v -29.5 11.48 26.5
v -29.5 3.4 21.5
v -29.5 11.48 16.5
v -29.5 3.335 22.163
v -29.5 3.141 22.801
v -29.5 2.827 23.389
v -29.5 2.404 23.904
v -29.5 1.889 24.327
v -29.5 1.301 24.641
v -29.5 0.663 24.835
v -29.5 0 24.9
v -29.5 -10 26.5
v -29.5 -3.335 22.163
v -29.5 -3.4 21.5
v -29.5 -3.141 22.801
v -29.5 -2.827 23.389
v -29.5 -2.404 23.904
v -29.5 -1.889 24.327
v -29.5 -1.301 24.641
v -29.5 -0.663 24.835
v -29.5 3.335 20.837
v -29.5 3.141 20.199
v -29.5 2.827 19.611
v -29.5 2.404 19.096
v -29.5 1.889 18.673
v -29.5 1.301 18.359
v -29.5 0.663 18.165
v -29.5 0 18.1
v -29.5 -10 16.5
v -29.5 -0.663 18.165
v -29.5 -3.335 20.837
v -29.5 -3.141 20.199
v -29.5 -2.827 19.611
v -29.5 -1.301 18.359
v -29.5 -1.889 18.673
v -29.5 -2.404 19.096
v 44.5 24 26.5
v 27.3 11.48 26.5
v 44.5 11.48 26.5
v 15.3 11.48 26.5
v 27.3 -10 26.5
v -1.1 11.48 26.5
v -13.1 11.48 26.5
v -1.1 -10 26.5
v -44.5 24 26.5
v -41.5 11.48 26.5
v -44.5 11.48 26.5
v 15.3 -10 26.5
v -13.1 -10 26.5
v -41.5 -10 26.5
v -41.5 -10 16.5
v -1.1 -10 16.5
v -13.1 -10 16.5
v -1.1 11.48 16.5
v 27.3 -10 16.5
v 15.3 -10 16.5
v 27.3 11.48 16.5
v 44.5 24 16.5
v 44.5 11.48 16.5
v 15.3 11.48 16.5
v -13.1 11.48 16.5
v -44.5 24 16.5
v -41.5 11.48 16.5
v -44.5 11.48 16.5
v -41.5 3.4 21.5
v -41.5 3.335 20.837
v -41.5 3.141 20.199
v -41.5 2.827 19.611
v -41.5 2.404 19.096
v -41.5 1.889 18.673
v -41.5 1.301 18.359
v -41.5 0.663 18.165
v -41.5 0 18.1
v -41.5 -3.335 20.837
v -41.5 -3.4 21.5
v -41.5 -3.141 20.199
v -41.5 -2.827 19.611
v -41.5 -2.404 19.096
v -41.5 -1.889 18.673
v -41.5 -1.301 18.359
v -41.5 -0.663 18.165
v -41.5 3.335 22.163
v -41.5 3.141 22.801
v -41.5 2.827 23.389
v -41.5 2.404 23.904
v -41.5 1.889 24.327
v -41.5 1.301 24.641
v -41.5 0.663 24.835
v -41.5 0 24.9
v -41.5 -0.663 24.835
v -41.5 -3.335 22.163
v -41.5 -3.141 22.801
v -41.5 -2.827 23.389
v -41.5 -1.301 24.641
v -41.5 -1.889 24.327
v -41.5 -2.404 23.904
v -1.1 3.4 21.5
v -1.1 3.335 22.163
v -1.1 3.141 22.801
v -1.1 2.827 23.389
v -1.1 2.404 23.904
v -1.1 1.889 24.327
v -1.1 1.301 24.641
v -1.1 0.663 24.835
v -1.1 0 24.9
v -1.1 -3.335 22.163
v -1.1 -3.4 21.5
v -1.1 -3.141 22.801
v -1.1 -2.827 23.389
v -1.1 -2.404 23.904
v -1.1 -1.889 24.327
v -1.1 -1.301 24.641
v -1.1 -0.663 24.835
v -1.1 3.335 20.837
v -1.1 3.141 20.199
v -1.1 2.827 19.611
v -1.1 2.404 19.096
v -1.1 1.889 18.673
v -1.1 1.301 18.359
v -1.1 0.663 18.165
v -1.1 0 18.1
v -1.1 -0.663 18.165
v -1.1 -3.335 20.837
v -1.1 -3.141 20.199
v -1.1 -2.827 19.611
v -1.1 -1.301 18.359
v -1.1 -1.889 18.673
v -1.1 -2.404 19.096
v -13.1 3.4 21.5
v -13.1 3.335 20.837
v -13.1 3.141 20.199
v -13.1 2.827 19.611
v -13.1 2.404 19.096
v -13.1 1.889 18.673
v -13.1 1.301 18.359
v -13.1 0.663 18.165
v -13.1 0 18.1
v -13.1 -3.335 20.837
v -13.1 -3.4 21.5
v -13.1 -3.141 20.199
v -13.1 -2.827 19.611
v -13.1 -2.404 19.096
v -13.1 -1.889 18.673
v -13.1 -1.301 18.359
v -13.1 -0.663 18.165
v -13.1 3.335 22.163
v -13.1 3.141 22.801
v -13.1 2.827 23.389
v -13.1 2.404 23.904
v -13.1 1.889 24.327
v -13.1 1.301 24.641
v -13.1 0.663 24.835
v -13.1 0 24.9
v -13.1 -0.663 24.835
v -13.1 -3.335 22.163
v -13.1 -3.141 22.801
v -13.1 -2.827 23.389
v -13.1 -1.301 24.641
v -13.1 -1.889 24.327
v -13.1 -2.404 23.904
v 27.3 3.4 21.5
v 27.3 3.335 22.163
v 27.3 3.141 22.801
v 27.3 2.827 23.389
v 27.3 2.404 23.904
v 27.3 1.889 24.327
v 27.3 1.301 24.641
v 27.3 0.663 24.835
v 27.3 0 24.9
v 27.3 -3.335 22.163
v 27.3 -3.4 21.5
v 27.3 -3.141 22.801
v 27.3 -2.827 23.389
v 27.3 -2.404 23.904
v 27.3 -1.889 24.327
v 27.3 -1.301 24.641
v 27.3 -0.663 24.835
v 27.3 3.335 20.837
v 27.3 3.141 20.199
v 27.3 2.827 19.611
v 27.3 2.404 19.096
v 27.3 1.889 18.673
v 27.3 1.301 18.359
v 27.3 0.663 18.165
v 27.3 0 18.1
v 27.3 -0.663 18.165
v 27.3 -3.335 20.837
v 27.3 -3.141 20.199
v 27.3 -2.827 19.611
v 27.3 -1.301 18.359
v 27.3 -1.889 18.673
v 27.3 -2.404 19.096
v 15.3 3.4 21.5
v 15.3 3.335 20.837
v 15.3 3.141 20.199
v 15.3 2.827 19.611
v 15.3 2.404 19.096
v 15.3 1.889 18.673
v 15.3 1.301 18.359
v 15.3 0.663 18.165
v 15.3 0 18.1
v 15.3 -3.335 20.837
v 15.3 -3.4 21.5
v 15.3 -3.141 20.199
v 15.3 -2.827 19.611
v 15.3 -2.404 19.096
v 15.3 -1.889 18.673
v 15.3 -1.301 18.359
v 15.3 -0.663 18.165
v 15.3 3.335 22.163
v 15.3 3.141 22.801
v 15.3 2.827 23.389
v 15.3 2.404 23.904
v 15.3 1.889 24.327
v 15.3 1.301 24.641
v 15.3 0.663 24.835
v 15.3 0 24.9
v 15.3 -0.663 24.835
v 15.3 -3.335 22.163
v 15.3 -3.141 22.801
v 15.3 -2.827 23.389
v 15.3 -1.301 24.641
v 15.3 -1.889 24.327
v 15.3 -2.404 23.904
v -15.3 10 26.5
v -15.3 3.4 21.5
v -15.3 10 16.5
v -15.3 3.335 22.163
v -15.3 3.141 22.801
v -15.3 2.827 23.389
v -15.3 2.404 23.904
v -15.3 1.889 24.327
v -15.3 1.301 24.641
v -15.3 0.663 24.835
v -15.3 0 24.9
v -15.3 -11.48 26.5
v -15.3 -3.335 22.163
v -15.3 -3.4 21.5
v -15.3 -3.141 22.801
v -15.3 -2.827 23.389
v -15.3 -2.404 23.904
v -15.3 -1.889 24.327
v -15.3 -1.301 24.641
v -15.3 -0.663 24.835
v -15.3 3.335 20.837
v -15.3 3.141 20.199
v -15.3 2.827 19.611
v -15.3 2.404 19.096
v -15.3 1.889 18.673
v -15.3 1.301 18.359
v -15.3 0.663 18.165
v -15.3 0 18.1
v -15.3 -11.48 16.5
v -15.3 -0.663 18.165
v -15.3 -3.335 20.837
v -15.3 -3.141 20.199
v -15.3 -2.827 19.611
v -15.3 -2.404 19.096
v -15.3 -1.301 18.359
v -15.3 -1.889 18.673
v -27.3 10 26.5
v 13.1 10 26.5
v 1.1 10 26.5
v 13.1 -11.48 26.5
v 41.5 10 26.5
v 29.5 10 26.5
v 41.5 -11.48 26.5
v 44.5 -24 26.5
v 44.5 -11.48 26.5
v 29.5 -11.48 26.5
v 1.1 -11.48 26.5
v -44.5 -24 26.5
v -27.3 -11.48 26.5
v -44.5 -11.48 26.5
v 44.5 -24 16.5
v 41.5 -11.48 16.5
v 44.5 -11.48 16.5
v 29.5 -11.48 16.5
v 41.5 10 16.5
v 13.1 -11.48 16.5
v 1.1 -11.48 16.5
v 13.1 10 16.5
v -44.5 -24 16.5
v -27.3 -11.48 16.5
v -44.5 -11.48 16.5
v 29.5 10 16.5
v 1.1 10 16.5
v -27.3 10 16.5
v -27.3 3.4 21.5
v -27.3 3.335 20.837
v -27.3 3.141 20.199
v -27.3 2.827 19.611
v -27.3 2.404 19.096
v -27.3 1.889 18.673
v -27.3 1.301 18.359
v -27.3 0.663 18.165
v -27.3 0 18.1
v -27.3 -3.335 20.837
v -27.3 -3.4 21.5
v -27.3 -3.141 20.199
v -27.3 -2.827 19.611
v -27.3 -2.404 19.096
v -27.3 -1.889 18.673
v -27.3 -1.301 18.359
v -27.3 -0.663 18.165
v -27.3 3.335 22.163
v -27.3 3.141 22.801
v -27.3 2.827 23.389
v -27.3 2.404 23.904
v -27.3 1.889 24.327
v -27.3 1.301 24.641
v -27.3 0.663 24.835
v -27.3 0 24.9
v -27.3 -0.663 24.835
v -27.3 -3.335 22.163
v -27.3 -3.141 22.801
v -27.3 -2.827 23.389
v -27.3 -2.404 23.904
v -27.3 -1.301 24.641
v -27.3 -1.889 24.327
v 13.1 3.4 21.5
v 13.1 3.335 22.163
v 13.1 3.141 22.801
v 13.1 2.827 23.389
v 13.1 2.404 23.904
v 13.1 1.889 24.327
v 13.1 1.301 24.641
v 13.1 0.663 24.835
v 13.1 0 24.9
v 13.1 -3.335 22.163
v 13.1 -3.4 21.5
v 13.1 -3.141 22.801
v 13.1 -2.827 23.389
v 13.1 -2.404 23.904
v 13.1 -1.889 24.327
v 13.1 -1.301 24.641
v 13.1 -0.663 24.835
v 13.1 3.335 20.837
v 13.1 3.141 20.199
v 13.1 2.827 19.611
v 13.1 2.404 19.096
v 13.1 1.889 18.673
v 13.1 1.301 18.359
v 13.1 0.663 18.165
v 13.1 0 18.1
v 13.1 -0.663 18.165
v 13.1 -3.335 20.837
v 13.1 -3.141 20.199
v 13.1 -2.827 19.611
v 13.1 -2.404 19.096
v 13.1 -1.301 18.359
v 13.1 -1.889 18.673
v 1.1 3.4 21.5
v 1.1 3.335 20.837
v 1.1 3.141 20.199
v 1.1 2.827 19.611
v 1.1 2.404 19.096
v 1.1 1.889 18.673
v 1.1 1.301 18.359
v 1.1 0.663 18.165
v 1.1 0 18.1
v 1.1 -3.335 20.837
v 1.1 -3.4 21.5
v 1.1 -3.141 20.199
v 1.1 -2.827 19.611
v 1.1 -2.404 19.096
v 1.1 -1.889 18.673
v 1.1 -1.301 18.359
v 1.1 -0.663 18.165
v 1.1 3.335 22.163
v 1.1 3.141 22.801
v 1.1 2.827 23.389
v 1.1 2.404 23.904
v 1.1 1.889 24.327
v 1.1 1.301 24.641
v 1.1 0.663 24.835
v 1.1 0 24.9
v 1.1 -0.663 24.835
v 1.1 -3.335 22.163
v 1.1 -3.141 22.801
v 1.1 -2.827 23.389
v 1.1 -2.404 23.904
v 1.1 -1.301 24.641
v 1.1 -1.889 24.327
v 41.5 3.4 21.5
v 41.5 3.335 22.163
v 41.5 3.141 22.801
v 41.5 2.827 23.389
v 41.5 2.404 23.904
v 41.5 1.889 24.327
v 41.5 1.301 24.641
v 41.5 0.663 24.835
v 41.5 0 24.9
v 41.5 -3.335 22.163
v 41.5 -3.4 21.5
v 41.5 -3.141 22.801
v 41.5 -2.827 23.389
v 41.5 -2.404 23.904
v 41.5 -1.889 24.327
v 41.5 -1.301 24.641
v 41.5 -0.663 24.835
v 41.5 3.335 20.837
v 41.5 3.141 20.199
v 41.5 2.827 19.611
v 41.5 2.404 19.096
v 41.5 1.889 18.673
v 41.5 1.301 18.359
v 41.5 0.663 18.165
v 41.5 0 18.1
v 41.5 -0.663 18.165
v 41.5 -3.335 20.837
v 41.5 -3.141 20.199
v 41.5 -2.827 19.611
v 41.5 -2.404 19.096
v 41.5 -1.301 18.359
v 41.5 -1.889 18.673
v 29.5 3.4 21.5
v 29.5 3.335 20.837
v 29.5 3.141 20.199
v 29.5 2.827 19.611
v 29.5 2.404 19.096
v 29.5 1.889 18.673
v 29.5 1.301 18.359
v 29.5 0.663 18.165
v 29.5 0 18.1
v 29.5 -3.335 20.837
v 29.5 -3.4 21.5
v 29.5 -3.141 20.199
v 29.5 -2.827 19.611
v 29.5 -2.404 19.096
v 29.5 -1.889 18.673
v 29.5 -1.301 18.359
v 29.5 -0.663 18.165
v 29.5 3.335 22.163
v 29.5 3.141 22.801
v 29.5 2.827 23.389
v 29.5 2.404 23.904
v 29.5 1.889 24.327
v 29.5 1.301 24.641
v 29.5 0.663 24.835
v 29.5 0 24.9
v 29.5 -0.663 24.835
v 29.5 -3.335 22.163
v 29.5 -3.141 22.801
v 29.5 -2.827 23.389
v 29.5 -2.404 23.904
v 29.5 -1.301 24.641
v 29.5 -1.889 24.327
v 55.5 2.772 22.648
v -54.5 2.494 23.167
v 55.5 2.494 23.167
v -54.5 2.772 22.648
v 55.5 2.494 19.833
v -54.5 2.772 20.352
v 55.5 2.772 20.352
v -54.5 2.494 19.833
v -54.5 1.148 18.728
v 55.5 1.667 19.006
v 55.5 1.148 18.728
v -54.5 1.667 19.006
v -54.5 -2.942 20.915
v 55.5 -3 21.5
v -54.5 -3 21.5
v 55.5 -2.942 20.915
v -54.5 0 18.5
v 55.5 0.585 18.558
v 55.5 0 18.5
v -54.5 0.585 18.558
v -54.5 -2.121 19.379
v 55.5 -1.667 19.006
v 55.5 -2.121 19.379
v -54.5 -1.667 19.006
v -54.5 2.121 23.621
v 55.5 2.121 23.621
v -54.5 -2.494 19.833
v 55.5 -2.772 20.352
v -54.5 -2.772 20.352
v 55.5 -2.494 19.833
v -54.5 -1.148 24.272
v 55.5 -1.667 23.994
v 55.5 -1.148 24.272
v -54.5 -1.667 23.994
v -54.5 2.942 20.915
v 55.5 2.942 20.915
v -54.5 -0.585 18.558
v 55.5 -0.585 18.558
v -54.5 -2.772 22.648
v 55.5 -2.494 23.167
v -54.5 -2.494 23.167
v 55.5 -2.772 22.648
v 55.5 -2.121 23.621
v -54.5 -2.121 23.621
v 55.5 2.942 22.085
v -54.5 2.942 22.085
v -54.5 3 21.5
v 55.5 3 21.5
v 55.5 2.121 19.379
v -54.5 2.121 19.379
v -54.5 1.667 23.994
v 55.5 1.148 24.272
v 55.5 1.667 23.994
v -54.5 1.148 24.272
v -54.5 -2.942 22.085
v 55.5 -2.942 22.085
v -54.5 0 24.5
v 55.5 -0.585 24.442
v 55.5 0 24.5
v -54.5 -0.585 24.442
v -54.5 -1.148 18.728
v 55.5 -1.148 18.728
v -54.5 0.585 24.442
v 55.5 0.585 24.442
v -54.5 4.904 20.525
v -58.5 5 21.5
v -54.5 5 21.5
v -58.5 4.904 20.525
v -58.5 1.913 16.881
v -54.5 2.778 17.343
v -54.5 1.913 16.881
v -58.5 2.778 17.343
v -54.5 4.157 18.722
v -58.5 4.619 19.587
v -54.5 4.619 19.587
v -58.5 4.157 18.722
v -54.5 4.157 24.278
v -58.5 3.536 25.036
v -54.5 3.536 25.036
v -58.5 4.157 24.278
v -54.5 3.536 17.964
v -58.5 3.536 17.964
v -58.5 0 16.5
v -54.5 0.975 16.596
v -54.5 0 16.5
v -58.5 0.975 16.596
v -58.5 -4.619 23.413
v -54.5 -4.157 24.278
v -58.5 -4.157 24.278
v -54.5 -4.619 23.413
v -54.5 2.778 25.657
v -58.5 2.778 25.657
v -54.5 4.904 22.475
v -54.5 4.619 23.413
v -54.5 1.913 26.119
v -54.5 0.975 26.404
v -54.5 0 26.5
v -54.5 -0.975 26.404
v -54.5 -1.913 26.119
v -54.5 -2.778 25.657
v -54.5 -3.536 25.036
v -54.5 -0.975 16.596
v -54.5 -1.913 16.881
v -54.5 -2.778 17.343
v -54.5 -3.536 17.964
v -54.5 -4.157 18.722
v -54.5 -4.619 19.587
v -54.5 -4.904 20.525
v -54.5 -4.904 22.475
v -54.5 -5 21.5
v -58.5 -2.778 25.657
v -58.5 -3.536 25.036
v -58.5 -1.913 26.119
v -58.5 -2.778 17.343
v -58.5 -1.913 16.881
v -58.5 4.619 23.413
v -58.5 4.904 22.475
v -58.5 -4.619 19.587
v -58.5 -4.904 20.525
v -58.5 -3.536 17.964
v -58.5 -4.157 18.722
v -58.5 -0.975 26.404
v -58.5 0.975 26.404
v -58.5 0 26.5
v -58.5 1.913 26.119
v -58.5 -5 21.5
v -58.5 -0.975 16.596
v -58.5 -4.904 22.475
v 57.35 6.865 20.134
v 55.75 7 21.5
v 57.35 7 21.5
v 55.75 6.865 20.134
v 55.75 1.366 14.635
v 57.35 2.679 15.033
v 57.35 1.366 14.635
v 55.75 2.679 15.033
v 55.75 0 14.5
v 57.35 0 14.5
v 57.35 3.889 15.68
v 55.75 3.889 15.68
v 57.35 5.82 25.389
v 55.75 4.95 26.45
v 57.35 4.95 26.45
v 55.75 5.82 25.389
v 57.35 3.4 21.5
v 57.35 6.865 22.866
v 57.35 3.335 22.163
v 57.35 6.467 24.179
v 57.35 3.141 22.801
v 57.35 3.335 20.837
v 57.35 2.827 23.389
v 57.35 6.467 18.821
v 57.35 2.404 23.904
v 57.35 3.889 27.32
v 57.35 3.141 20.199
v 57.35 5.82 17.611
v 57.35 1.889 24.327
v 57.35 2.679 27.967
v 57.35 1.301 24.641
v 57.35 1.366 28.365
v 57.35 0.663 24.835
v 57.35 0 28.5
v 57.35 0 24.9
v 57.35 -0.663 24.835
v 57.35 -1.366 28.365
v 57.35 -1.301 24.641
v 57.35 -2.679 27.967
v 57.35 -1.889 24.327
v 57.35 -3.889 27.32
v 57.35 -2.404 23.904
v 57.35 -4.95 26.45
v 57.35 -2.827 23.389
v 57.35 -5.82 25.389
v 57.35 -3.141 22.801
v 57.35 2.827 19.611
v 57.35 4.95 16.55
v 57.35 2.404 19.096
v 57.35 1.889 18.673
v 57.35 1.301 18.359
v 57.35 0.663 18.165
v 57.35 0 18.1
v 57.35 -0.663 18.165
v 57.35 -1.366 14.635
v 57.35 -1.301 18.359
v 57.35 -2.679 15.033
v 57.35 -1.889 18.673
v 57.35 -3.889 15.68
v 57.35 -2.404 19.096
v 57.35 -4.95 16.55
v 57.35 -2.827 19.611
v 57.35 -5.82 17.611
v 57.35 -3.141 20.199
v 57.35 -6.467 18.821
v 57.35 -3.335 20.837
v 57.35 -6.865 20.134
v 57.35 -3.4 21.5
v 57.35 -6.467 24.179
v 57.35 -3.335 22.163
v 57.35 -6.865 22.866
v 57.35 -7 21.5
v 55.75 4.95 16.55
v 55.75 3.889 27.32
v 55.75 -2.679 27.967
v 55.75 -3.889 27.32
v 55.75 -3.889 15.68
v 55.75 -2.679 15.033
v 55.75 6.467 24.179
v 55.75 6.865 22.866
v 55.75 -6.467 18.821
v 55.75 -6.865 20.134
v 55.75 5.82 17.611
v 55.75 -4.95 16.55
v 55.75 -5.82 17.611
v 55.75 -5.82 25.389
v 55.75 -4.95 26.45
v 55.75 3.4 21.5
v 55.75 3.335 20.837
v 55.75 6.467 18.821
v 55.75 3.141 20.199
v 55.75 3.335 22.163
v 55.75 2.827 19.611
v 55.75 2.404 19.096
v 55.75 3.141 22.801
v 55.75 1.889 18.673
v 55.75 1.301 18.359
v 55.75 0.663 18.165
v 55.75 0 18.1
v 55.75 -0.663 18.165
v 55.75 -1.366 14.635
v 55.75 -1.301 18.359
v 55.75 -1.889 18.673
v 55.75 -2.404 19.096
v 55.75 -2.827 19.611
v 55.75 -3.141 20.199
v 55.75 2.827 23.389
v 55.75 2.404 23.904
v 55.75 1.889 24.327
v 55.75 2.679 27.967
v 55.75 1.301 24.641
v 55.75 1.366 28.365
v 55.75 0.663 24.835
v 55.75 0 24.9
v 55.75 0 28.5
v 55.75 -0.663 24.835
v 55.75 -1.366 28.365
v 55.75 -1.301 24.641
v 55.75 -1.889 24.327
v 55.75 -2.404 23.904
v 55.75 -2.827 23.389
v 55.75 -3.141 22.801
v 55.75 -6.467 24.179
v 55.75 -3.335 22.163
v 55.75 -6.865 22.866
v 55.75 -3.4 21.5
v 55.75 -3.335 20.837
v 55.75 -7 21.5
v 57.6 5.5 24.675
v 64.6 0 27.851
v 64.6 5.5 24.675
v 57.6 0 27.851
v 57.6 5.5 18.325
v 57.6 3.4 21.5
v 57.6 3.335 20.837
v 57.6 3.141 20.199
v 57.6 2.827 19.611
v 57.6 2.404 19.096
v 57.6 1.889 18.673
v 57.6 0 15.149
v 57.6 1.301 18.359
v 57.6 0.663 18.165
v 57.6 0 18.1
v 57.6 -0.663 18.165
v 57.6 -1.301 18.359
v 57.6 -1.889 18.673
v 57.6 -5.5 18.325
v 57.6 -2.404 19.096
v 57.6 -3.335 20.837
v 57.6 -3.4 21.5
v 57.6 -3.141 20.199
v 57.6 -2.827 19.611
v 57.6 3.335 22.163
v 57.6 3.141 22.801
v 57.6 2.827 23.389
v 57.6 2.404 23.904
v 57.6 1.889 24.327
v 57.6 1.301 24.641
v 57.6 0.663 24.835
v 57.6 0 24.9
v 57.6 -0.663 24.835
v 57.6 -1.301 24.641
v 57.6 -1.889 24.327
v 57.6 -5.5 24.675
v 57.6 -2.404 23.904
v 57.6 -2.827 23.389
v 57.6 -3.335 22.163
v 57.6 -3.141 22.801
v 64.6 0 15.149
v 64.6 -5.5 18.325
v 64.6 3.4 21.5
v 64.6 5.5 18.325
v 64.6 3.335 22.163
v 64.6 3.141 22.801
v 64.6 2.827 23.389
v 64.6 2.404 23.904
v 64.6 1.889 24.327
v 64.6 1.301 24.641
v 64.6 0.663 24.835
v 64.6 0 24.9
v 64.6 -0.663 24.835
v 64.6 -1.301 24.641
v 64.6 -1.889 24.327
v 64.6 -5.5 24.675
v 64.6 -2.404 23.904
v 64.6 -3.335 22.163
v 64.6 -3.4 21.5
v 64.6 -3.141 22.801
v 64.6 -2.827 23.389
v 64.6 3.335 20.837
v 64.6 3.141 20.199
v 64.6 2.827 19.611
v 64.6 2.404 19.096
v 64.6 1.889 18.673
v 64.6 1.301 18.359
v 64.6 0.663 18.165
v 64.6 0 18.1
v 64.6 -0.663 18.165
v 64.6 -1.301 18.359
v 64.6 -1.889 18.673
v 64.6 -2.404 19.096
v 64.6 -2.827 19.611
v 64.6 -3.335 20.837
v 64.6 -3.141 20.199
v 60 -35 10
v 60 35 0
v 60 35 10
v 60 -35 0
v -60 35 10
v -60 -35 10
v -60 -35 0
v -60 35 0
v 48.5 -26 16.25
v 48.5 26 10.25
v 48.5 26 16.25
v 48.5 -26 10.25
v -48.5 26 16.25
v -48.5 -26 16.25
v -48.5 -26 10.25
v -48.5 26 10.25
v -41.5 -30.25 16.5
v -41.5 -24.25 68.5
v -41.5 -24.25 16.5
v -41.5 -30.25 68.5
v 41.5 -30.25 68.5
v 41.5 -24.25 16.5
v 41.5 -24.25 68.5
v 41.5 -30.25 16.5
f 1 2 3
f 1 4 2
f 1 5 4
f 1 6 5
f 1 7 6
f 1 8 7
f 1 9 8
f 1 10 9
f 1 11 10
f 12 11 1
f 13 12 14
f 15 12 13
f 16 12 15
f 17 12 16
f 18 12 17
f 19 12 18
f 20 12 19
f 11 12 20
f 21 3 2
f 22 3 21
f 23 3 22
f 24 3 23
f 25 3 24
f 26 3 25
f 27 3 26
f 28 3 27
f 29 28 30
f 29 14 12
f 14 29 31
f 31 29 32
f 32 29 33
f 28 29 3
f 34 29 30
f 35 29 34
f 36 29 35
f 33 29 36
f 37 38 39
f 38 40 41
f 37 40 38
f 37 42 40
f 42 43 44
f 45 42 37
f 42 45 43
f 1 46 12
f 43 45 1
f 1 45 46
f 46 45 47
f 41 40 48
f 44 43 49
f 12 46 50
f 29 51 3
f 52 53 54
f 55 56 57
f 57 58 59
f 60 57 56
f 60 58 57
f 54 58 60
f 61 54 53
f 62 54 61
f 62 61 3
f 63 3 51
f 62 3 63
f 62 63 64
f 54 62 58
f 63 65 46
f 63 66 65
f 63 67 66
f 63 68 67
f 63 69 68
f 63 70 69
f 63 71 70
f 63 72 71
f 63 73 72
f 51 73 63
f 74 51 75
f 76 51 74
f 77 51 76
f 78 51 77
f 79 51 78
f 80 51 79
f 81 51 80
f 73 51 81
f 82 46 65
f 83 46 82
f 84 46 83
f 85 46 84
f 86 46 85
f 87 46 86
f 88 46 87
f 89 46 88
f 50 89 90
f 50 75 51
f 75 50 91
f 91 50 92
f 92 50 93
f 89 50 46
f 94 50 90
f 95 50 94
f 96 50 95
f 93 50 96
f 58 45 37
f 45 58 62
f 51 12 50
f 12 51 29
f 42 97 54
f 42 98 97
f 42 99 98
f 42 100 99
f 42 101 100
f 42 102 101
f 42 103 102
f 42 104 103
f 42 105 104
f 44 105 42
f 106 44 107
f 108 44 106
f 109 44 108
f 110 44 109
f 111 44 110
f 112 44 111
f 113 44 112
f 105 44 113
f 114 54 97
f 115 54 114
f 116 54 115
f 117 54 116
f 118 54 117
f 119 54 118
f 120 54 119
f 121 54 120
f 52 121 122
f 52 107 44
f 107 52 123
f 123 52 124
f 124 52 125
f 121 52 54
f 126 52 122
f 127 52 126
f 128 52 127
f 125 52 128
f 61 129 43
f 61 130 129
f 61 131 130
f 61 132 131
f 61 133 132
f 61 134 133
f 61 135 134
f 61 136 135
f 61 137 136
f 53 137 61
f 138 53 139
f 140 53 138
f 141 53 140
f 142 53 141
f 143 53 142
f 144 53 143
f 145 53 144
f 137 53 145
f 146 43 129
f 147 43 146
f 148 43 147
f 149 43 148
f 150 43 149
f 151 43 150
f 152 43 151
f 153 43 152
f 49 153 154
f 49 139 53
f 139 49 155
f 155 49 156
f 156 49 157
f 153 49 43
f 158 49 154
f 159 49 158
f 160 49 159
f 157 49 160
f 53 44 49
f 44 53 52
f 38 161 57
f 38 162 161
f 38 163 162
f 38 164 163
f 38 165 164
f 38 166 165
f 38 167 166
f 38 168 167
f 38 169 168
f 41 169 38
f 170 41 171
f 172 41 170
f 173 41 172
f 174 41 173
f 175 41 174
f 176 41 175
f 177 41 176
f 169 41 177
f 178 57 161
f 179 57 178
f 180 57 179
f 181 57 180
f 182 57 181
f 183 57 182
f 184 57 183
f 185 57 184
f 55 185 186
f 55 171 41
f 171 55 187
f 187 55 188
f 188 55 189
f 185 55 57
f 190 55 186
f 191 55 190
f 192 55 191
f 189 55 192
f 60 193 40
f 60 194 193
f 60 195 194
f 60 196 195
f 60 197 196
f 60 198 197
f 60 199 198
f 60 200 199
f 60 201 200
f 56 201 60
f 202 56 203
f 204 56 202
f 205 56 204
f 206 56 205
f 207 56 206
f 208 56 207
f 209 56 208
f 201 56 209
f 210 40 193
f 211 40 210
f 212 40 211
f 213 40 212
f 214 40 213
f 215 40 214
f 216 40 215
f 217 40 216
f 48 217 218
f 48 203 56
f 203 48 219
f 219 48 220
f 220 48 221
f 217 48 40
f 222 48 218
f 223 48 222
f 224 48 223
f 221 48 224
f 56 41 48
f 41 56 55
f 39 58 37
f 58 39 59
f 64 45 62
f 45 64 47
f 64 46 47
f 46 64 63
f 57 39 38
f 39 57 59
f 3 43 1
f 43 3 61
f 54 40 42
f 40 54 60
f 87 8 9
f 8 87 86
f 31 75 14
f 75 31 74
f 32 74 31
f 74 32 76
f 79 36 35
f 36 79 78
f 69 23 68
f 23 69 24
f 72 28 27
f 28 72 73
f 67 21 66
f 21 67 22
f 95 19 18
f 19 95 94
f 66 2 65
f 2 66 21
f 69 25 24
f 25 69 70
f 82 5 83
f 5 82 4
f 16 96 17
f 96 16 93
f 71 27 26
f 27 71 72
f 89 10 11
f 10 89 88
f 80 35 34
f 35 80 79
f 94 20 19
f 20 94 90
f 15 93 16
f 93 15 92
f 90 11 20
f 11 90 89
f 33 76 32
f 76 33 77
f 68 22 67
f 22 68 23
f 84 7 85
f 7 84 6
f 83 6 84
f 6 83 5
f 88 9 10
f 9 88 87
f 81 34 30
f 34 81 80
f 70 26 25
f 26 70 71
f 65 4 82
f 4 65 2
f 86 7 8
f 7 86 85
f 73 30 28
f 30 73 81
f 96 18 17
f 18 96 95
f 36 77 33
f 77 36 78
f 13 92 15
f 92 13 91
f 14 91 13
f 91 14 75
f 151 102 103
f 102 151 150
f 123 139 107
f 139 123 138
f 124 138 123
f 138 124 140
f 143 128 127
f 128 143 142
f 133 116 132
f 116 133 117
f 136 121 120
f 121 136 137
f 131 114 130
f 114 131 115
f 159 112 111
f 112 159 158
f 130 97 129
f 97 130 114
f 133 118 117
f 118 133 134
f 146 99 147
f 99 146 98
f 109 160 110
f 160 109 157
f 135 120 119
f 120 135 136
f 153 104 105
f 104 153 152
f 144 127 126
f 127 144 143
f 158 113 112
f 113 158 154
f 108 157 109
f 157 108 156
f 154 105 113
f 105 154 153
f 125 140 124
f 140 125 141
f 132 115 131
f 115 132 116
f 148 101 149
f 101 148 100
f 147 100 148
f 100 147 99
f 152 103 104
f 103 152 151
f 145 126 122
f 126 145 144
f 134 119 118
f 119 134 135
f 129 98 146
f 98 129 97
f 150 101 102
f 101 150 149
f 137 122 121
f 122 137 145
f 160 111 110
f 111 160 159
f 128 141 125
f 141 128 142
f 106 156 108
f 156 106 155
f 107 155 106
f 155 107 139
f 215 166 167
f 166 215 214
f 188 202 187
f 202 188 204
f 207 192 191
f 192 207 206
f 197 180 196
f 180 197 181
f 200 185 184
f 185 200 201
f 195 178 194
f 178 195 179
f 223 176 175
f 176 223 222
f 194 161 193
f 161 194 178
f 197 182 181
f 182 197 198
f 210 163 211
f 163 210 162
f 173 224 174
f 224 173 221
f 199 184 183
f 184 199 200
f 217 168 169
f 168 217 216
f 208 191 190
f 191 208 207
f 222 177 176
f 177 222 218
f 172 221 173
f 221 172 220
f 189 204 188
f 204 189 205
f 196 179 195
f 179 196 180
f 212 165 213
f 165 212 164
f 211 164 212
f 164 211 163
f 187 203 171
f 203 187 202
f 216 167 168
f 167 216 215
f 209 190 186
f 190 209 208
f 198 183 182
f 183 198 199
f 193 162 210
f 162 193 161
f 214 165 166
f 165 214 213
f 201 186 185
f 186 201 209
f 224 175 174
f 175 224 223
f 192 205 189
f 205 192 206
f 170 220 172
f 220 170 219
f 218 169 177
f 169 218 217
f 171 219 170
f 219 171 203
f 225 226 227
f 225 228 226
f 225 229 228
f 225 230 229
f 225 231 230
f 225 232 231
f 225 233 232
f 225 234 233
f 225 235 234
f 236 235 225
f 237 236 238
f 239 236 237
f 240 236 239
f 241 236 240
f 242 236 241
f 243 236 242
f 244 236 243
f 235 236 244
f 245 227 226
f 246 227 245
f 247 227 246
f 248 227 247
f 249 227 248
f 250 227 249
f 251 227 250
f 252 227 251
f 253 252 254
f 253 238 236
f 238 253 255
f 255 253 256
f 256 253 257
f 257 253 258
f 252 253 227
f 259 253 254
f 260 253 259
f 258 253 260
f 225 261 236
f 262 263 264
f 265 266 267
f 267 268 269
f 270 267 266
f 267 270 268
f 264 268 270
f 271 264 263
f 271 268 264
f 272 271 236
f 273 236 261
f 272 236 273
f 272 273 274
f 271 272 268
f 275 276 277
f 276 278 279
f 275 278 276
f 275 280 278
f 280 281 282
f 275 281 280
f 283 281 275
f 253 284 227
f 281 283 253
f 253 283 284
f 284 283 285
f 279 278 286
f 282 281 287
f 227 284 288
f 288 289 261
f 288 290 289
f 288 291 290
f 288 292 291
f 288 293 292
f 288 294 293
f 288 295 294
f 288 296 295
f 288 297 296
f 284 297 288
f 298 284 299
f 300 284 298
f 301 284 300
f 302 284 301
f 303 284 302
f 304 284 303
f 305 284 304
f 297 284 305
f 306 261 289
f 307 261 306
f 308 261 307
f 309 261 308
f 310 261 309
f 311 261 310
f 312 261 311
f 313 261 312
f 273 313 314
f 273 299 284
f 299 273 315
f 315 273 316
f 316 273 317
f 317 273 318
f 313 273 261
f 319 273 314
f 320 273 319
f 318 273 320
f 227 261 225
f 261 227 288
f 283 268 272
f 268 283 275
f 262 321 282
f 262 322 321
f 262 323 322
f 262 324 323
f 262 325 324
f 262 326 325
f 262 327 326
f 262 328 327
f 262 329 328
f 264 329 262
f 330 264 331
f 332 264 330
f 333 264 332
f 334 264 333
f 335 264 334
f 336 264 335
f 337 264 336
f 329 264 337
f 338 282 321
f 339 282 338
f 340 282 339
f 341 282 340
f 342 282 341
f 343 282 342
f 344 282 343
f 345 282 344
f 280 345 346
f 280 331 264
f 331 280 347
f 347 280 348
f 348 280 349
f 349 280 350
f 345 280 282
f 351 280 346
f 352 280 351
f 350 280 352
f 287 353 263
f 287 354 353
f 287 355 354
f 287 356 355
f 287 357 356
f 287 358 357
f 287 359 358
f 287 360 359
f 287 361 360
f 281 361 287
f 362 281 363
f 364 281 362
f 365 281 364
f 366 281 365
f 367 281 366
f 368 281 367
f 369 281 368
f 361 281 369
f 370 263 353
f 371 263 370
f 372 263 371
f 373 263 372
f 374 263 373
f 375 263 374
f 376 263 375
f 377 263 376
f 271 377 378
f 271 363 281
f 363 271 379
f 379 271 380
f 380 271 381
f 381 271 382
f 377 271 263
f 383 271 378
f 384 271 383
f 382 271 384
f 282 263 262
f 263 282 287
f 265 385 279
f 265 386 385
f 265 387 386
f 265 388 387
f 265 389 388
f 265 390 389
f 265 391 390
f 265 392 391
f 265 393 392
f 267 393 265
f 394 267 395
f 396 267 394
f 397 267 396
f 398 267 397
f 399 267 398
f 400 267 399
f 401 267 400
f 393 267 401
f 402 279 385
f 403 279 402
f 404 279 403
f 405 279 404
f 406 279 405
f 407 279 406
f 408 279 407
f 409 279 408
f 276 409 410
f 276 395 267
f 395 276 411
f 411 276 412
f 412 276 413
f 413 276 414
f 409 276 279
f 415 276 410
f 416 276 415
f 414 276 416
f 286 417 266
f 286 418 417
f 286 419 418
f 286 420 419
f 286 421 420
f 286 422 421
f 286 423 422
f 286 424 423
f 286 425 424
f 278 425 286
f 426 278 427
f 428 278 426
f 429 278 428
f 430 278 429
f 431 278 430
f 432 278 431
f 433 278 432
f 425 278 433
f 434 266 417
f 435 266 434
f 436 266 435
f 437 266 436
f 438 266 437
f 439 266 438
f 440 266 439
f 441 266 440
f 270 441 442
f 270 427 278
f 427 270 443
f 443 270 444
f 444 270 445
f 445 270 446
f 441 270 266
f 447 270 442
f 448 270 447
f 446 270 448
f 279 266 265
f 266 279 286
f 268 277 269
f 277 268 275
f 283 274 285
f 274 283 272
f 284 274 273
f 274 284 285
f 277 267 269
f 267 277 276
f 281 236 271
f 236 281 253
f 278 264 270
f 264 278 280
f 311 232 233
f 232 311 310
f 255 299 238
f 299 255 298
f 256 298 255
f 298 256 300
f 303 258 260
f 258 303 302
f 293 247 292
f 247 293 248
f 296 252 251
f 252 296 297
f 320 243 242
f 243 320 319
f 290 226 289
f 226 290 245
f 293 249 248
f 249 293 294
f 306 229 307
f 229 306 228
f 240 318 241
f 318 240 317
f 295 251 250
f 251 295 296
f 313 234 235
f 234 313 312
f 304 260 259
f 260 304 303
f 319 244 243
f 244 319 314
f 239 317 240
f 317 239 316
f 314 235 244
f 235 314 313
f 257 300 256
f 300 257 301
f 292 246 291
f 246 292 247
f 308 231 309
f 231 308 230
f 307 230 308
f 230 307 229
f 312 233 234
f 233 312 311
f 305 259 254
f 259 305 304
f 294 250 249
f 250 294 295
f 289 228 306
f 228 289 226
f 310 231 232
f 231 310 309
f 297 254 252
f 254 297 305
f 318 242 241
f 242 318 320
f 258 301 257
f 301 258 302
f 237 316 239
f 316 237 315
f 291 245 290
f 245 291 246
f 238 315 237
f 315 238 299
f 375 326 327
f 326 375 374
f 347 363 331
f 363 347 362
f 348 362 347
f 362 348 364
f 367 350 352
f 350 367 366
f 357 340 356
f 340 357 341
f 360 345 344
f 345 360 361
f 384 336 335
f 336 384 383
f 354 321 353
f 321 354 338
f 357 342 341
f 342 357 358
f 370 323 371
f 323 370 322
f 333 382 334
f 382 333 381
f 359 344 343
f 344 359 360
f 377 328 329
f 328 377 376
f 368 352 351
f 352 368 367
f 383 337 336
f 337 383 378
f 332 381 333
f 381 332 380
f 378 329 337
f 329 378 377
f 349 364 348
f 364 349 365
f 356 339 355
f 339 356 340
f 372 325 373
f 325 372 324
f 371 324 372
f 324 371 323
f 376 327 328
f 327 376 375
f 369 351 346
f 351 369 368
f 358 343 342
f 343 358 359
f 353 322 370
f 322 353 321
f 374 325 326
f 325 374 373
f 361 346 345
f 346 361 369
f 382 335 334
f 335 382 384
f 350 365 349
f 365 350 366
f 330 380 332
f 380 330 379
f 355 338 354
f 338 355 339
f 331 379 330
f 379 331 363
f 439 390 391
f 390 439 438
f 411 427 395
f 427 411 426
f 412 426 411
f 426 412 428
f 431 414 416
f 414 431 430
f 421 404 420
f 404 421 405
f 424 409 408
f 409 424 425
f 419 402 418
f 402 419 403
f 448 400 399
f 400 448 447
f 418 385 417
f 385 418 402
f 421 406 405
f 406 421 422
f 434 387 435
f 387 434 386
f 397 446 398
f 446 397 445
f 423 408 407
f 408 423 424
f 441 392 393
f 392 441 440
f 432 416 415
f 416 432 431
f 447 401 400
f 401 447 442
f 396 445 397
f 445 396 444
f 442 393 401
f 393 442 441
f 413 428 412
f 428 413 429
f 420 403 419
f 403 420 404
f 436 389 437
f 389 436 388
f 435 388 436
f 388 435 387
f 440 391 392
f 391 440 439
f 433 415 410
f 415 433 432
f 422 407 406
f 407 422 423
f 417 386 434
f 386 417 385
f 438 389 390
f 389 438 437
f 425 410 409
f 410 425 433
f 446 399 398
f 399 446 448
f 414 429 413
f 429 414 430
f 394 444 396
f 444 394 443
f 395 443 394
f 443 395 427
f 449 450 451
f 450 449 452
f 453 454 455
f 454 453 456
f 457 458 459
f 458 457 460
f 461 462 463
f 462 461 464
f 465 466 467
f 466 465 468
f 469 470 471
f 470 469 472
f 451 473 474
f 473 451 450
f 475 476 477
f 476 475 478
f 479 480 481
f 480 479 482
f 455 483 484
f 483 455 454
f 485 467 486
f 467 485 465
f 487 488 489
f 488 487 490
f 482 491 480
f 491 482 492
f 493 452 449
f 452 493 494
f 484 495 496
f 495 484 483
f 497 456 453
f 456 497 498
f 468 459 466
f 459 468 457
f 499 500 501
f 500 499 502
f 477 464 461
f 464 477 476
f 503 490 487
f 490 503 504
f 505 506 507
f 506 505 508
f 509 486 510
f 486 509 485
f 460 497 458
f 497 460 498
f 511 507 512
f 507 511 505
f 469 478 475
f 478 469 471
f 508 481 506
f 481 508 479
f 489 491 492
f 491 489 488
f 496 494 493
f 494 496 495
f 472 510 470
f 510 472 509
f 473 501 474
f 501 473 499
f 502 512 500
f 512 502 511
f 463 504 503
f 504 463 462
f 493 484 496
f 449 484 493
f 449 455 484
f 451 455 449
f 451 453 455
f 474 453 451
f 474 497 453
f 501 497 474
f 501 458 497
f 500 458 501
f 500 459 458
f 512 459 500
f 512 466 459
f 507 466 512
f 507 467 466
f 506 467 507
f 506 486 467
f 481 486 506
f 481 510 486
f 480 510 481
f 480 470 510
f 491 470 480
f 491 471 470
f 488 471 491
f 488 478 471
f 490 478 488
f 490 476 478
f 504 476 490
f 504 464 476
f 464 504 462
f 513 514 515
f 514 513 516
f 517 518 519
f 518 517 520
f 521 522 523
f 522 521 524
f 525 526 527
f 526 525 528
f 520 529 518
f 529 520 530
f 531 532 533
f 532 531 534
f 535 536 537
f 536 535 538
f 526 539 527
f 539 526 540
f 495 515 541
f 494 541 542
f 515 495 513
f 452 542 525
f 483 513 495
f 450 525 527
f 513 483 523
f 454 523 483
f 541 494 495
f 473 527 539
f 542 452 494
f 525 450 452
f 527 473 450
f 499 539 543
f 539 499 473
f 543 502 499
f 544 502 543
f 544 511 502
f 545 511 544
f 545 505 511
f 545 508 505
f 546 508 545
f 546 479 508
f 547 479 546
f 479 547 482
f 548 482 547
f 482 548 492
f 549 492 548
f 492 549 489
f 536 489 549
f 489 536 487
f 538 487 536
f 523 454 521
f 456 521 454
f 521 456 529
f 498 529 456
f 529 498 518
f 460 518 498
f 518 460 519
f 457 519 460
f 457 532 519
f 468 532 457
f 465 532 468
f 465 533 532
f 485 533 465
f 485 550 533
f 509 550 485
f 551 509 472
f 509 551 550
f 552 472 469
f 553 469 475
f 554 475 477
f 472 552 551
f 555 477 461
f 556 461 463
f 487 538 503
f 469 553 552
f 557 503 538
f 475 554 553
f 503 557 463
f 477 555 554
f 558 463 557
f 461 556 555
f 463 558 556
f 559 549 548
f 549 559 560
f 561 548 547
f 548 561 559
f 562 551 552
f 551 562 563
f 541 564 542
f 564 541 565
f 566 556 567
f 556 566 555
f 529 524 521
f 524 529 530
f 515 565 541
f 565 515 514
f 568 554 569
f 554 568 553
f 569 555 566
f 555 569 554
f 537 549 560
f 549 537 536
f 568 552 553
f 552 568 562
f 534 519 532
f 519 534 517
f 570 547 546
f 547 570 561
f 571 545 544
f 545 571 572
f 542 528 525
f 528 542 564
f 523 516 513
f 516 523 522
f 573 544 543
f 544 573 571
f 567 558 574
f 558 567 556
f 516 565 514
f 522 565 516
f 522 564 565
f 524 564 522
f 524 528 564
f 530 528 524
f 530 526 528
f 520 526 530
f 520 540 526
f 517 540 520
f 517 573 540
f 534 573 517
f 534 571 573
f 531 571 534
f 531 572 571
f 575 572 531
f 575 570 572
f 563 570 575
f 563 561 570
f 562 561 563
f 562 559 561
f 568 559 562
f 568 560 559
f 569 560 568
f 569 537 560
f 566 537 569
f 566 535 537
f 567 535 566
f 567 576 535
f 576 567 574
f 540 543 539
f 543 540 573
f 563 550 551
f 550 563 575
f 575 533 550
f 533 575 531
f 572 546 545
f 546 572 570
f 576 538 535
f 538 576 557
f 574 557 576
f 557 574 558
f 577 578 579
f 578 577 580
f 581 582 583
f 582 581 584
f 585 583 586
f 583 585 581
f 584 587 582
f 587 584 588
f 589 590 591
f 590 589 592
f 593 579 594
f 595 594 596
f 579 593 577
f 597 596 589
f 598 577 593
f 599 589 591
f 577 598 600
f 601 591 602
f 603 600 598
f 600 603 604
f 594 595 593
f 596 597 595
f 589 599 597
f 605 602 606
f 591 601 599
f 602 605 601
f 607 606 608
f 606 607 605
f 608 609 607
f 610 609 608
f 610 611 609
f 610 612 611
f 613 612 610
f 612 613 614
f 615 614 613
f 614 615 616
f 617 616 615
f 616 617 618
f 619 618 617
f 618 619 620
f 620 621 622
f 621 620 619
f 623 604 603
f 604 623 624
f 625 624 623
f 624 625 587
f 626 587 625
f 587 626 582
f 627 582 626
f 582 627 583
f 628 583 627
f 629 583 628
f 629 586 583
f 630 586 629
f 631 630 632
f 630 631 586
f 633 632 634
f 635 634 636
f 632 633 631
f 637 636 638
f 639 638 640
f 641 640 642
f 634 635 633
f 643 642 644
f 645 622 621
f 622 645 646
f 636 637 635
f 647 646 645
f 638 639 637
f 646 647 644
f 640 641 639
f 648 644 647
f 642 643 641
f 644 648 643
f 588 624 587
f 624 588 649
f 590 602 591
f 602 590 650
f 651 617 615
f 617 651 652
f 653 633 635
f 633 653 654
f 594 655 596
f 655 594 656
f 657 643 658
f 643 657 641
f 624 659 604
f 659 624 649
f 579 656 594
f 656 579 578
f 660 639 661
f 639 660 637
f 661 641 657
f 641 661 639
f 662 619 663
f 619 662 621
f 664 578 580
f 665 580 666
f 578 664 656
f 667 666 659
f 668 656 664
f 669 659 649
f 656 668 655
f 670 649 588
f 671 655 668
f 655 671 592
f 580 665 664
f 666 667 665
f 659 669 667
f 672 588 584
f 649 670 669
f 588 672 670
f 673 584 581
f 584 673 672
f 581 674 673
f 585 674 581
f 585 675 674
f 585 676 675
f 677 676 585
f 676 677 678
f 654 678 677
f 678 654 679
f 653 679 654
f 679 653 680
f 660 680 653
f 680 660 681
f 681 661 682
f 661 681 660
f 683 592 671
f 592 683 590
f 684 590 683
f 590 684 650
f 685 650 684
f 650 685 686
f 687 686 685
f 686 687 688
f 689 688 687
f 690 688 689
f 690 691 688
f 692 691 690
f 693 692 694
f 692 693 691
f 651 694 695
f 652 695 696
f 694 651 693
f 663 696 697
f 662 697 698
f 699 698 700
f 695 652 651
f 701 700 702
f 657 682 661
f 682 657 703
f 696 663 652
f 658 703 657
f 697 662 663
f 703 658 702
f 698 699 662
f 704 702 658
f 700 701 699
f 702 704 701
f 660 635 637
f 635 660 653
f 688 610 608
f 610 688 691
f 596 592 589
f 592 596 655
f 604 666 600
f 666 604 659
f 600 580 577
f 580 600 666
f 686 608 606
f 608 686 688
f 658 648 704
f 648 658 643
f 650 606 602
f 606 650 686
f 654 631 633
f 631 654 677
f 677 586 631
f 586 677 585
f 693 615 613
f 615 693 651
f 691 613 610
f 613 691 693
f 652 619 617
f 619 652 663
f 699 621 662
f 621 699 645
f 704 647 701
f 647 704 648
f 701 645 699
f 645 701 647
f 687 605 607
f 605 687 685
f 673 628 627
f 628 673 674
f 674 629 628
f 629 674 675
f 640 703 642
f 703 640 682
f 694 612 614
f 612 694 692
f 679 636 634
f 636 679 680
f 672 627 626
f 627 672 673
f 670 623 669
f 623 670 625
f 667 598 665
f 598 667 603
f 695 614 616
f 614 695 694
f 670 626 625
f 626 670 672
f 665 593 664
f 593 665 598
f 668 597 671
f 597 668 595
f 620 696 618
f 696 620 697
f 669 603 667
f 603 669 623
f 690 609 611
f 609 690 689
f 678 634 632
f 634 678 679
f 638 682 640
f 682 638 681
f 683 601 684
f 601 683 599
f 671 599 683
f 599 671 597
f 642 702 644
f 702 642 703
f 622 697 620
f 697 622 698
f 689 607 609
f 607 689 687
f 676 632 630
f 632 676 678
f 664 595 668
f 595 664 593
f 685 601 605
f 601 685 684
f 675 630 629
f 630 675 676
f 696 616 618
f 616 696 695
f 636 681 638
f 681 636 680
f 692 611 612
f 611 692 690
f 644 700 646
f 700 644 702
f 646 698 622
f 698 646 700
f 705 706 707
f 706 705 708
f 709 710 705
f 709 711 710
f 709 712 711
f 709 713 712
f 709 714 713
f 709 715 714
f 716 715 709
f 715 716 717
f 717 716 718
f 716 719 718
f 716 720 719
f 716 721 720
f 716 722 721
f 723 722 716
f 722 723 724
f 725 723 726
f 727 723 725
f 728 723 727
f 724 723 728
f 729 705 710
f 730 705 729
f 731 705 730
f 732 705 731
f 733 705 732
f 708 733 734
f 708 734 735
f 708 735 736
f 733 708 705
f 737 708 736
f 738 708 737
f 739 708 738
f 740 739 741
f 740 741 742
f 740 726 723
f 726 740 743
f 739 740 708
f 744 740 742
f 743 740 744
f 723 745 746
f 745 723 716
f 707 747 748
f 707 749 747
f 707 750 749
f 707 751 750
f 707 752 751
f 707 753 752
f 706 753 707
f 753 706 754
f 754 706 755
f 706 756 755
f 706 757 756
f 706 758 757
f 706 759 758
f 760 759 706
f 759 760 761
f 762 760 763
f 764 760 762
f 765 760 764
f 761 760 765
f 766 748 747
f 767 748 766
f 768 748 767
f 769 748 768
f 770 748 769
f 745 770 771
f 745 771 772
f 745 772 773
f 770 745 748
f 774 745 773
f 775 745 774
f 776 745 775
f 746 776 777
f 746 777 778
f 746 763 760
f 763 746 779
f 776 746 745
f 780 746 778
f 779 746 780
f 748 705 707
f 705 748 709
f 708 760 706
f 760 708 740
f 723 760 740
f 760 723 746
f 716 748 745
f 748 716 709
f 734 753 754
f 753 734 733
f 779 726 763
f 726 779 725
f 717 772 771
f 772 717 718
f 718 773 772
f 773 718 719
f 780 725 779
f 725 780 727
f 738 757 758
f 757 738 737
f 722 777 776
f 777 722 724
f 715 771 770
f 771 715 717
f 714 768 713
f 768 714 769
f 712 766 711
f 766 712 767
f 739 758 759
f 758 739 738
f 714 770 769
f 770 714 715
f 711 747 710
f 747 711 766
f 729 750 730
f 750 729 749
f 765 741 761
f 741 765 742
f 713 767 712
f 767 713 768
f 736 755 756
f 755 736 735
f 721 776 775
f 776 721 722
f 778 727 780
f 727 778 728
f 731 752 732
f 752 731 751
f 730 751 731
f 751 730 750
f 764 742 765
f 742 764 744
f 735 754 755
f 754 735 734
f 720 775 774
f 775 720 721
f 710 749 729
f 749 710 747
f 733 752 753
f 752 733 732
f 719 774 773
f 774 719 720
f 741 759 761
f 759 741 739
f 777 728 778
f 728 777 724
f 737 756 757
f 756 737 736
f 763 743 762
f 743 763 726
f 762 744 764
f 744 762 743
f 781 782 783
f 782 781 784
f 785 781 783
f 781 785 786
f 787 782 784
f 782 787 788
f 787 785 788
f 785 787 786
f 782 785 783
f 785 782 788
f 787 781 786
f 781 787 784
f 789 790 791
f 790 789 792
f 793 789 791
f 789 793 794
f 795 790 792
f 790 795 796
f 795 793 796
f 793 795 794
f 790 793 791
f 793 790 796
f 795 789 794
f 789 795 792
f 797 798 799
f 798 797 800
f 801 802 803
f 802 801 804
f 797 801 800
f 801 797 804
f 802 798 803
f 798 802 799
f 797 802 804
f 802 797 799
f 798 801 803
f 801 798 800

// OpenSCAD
$fn = 32;

// ------------------------------------------------------------------------
// Comb hinge with flap: leaf 89 x 24 mm, pin d6, flap 52 mm
// Every part is its own module, assembly() places every instance.
// ------------------------------------------------------------------------

// --- part 1 ---
module hinge_bed() {
  difference() {
    translate([-60, -35, 0]) cube([120, 70, 10]);
  }
}

// --- part 2 ---
module hinge_riser() {
  difference() {
    translate([-48.5, -26, 0]) cube([97, 52, 6]);
  }
}

// --- part 3 ---
module hinge_leaf_a() {
  difference() {
    union() {
      translate([-41.5, -10, -5]) cube([12, 34, 10]);
      translate([-13.1, -10, -5]) cube([12, 34, 10]);
      translate([15.3, -10, -5]) cube([12, 34, 10]);
      translate([-44.5, 11.48, -5]) cube([89, 12.52, 10]);
    }
    translate([-35.5, 0, 0]) rotate([0, 90, 0]) cylinder(h = 14, d = 6.8, center = true);
    translate([-7.1, 0, 0]) rotate([0, 90, 0]) cylinder(h = 14, d = 6.8, center = true);
    translate([21.3, 0, 0]) rotate([0, 90, 0]) cylinder(h = 14, d = 6.8, center = true);
  }
}

// --- part 4 ---
module hinge_leaf_b() {
  difference() {
    union() {
      translate([-27.3, -24, -5]) cube([12, 34, 10]);
      translate([1.1, -24, -5]) cube([12, 34, 10]);
      translate([29.5, -24, -5]) cube([12, 34, 10]);
      translate([-44.5, -24, -5]) cube([89, 12.52, 10]);
    }
    translate([-21.3, 0, 0]) rotate([0, 90, 0]) cylinder(h = 14, d = 6.8, center = true);
    translate([7.1, 0, 0]) rotate([0, 90, 0]) cylinder(h = 14, d = 6.8, center = true);
    translate([35.5, 0, 0]) rotate([0, 90, 0]) cylinder(h = 14, d = 6.8, center = true);
  }
}

// --- part 5 ---
module hinge_flap() {
  difference() {
    translate([-41.5, -26, 0]) cube([83, 52, 6]);
  }
}

// --- part 6 ---
module hinge_pin() {
  rotate([0, 90, 0]) cylinder(h = 111, d = 6, center = true);
  translate([-58.5, 0, 0]) rotate([0, 90, 0]) cylinder(h = 4, d = 10);
}

// --- part 7 ---
module pin_washer() {
  difference() {
      translate([0, 0, 0]) cylinder(h = 1.6, d = 14);
      translate([0, 0, -1]) cylinder(h = 3.6, d = 6.8);
    }
}

// --- part 8 ---
module pin_nut() {
  difference() {
    linear_extrude(height = 7) polygon(points = [[6.351, 0], [3.175, 5.5], [-3.175, 5.5], [-6.351, 0], [-3.175, -5.5], [3.175, -5.5]]);
    translate([0, 0, -1]) cylinder(h = 9, d = 6.8);
  }
}

// --- assembly ---
module assembly() {
  color([0.80, 0.24, 0.20]) translate([0, 0, 0]) rotate([0, 0, 0]) hinge_bed();
  color([0.20, 0.45, 0.75]) translate([0, 0, 10.25]) rotate([0, 0, 0]) hinge_riser();
  color([0.25, 0.62, 0.32]) translate([0, 0, 21.5]) rotate([0, 0, 0]) hinge_leaf_a();
  color([0.92, 0.70, 0.18]) translate([0, 0, 21.5]) rotate([0, 0, 0]) hinge_leaf_b();
  color([0.58, 0.35, 0.70]) translate([0, -24.25, 42.5]) rotate([90, 0, 0]) hinge_flap();
  color([0.16, 0.66, 0.66]) translate([0, 0, 21.5]) rotate([0, 0, 0]) hinge_pin();
  color([0.85, 0.48, 0.18]) translate([55.75, 0, 21.5]) rotate([0, 90, 0]) pin_washer();
  color([0.55, 0.60, 0.65]) translate([57.6, 0, 21.5]) rotate([0, 90, 0]) pin_nut();
}

assembly();
